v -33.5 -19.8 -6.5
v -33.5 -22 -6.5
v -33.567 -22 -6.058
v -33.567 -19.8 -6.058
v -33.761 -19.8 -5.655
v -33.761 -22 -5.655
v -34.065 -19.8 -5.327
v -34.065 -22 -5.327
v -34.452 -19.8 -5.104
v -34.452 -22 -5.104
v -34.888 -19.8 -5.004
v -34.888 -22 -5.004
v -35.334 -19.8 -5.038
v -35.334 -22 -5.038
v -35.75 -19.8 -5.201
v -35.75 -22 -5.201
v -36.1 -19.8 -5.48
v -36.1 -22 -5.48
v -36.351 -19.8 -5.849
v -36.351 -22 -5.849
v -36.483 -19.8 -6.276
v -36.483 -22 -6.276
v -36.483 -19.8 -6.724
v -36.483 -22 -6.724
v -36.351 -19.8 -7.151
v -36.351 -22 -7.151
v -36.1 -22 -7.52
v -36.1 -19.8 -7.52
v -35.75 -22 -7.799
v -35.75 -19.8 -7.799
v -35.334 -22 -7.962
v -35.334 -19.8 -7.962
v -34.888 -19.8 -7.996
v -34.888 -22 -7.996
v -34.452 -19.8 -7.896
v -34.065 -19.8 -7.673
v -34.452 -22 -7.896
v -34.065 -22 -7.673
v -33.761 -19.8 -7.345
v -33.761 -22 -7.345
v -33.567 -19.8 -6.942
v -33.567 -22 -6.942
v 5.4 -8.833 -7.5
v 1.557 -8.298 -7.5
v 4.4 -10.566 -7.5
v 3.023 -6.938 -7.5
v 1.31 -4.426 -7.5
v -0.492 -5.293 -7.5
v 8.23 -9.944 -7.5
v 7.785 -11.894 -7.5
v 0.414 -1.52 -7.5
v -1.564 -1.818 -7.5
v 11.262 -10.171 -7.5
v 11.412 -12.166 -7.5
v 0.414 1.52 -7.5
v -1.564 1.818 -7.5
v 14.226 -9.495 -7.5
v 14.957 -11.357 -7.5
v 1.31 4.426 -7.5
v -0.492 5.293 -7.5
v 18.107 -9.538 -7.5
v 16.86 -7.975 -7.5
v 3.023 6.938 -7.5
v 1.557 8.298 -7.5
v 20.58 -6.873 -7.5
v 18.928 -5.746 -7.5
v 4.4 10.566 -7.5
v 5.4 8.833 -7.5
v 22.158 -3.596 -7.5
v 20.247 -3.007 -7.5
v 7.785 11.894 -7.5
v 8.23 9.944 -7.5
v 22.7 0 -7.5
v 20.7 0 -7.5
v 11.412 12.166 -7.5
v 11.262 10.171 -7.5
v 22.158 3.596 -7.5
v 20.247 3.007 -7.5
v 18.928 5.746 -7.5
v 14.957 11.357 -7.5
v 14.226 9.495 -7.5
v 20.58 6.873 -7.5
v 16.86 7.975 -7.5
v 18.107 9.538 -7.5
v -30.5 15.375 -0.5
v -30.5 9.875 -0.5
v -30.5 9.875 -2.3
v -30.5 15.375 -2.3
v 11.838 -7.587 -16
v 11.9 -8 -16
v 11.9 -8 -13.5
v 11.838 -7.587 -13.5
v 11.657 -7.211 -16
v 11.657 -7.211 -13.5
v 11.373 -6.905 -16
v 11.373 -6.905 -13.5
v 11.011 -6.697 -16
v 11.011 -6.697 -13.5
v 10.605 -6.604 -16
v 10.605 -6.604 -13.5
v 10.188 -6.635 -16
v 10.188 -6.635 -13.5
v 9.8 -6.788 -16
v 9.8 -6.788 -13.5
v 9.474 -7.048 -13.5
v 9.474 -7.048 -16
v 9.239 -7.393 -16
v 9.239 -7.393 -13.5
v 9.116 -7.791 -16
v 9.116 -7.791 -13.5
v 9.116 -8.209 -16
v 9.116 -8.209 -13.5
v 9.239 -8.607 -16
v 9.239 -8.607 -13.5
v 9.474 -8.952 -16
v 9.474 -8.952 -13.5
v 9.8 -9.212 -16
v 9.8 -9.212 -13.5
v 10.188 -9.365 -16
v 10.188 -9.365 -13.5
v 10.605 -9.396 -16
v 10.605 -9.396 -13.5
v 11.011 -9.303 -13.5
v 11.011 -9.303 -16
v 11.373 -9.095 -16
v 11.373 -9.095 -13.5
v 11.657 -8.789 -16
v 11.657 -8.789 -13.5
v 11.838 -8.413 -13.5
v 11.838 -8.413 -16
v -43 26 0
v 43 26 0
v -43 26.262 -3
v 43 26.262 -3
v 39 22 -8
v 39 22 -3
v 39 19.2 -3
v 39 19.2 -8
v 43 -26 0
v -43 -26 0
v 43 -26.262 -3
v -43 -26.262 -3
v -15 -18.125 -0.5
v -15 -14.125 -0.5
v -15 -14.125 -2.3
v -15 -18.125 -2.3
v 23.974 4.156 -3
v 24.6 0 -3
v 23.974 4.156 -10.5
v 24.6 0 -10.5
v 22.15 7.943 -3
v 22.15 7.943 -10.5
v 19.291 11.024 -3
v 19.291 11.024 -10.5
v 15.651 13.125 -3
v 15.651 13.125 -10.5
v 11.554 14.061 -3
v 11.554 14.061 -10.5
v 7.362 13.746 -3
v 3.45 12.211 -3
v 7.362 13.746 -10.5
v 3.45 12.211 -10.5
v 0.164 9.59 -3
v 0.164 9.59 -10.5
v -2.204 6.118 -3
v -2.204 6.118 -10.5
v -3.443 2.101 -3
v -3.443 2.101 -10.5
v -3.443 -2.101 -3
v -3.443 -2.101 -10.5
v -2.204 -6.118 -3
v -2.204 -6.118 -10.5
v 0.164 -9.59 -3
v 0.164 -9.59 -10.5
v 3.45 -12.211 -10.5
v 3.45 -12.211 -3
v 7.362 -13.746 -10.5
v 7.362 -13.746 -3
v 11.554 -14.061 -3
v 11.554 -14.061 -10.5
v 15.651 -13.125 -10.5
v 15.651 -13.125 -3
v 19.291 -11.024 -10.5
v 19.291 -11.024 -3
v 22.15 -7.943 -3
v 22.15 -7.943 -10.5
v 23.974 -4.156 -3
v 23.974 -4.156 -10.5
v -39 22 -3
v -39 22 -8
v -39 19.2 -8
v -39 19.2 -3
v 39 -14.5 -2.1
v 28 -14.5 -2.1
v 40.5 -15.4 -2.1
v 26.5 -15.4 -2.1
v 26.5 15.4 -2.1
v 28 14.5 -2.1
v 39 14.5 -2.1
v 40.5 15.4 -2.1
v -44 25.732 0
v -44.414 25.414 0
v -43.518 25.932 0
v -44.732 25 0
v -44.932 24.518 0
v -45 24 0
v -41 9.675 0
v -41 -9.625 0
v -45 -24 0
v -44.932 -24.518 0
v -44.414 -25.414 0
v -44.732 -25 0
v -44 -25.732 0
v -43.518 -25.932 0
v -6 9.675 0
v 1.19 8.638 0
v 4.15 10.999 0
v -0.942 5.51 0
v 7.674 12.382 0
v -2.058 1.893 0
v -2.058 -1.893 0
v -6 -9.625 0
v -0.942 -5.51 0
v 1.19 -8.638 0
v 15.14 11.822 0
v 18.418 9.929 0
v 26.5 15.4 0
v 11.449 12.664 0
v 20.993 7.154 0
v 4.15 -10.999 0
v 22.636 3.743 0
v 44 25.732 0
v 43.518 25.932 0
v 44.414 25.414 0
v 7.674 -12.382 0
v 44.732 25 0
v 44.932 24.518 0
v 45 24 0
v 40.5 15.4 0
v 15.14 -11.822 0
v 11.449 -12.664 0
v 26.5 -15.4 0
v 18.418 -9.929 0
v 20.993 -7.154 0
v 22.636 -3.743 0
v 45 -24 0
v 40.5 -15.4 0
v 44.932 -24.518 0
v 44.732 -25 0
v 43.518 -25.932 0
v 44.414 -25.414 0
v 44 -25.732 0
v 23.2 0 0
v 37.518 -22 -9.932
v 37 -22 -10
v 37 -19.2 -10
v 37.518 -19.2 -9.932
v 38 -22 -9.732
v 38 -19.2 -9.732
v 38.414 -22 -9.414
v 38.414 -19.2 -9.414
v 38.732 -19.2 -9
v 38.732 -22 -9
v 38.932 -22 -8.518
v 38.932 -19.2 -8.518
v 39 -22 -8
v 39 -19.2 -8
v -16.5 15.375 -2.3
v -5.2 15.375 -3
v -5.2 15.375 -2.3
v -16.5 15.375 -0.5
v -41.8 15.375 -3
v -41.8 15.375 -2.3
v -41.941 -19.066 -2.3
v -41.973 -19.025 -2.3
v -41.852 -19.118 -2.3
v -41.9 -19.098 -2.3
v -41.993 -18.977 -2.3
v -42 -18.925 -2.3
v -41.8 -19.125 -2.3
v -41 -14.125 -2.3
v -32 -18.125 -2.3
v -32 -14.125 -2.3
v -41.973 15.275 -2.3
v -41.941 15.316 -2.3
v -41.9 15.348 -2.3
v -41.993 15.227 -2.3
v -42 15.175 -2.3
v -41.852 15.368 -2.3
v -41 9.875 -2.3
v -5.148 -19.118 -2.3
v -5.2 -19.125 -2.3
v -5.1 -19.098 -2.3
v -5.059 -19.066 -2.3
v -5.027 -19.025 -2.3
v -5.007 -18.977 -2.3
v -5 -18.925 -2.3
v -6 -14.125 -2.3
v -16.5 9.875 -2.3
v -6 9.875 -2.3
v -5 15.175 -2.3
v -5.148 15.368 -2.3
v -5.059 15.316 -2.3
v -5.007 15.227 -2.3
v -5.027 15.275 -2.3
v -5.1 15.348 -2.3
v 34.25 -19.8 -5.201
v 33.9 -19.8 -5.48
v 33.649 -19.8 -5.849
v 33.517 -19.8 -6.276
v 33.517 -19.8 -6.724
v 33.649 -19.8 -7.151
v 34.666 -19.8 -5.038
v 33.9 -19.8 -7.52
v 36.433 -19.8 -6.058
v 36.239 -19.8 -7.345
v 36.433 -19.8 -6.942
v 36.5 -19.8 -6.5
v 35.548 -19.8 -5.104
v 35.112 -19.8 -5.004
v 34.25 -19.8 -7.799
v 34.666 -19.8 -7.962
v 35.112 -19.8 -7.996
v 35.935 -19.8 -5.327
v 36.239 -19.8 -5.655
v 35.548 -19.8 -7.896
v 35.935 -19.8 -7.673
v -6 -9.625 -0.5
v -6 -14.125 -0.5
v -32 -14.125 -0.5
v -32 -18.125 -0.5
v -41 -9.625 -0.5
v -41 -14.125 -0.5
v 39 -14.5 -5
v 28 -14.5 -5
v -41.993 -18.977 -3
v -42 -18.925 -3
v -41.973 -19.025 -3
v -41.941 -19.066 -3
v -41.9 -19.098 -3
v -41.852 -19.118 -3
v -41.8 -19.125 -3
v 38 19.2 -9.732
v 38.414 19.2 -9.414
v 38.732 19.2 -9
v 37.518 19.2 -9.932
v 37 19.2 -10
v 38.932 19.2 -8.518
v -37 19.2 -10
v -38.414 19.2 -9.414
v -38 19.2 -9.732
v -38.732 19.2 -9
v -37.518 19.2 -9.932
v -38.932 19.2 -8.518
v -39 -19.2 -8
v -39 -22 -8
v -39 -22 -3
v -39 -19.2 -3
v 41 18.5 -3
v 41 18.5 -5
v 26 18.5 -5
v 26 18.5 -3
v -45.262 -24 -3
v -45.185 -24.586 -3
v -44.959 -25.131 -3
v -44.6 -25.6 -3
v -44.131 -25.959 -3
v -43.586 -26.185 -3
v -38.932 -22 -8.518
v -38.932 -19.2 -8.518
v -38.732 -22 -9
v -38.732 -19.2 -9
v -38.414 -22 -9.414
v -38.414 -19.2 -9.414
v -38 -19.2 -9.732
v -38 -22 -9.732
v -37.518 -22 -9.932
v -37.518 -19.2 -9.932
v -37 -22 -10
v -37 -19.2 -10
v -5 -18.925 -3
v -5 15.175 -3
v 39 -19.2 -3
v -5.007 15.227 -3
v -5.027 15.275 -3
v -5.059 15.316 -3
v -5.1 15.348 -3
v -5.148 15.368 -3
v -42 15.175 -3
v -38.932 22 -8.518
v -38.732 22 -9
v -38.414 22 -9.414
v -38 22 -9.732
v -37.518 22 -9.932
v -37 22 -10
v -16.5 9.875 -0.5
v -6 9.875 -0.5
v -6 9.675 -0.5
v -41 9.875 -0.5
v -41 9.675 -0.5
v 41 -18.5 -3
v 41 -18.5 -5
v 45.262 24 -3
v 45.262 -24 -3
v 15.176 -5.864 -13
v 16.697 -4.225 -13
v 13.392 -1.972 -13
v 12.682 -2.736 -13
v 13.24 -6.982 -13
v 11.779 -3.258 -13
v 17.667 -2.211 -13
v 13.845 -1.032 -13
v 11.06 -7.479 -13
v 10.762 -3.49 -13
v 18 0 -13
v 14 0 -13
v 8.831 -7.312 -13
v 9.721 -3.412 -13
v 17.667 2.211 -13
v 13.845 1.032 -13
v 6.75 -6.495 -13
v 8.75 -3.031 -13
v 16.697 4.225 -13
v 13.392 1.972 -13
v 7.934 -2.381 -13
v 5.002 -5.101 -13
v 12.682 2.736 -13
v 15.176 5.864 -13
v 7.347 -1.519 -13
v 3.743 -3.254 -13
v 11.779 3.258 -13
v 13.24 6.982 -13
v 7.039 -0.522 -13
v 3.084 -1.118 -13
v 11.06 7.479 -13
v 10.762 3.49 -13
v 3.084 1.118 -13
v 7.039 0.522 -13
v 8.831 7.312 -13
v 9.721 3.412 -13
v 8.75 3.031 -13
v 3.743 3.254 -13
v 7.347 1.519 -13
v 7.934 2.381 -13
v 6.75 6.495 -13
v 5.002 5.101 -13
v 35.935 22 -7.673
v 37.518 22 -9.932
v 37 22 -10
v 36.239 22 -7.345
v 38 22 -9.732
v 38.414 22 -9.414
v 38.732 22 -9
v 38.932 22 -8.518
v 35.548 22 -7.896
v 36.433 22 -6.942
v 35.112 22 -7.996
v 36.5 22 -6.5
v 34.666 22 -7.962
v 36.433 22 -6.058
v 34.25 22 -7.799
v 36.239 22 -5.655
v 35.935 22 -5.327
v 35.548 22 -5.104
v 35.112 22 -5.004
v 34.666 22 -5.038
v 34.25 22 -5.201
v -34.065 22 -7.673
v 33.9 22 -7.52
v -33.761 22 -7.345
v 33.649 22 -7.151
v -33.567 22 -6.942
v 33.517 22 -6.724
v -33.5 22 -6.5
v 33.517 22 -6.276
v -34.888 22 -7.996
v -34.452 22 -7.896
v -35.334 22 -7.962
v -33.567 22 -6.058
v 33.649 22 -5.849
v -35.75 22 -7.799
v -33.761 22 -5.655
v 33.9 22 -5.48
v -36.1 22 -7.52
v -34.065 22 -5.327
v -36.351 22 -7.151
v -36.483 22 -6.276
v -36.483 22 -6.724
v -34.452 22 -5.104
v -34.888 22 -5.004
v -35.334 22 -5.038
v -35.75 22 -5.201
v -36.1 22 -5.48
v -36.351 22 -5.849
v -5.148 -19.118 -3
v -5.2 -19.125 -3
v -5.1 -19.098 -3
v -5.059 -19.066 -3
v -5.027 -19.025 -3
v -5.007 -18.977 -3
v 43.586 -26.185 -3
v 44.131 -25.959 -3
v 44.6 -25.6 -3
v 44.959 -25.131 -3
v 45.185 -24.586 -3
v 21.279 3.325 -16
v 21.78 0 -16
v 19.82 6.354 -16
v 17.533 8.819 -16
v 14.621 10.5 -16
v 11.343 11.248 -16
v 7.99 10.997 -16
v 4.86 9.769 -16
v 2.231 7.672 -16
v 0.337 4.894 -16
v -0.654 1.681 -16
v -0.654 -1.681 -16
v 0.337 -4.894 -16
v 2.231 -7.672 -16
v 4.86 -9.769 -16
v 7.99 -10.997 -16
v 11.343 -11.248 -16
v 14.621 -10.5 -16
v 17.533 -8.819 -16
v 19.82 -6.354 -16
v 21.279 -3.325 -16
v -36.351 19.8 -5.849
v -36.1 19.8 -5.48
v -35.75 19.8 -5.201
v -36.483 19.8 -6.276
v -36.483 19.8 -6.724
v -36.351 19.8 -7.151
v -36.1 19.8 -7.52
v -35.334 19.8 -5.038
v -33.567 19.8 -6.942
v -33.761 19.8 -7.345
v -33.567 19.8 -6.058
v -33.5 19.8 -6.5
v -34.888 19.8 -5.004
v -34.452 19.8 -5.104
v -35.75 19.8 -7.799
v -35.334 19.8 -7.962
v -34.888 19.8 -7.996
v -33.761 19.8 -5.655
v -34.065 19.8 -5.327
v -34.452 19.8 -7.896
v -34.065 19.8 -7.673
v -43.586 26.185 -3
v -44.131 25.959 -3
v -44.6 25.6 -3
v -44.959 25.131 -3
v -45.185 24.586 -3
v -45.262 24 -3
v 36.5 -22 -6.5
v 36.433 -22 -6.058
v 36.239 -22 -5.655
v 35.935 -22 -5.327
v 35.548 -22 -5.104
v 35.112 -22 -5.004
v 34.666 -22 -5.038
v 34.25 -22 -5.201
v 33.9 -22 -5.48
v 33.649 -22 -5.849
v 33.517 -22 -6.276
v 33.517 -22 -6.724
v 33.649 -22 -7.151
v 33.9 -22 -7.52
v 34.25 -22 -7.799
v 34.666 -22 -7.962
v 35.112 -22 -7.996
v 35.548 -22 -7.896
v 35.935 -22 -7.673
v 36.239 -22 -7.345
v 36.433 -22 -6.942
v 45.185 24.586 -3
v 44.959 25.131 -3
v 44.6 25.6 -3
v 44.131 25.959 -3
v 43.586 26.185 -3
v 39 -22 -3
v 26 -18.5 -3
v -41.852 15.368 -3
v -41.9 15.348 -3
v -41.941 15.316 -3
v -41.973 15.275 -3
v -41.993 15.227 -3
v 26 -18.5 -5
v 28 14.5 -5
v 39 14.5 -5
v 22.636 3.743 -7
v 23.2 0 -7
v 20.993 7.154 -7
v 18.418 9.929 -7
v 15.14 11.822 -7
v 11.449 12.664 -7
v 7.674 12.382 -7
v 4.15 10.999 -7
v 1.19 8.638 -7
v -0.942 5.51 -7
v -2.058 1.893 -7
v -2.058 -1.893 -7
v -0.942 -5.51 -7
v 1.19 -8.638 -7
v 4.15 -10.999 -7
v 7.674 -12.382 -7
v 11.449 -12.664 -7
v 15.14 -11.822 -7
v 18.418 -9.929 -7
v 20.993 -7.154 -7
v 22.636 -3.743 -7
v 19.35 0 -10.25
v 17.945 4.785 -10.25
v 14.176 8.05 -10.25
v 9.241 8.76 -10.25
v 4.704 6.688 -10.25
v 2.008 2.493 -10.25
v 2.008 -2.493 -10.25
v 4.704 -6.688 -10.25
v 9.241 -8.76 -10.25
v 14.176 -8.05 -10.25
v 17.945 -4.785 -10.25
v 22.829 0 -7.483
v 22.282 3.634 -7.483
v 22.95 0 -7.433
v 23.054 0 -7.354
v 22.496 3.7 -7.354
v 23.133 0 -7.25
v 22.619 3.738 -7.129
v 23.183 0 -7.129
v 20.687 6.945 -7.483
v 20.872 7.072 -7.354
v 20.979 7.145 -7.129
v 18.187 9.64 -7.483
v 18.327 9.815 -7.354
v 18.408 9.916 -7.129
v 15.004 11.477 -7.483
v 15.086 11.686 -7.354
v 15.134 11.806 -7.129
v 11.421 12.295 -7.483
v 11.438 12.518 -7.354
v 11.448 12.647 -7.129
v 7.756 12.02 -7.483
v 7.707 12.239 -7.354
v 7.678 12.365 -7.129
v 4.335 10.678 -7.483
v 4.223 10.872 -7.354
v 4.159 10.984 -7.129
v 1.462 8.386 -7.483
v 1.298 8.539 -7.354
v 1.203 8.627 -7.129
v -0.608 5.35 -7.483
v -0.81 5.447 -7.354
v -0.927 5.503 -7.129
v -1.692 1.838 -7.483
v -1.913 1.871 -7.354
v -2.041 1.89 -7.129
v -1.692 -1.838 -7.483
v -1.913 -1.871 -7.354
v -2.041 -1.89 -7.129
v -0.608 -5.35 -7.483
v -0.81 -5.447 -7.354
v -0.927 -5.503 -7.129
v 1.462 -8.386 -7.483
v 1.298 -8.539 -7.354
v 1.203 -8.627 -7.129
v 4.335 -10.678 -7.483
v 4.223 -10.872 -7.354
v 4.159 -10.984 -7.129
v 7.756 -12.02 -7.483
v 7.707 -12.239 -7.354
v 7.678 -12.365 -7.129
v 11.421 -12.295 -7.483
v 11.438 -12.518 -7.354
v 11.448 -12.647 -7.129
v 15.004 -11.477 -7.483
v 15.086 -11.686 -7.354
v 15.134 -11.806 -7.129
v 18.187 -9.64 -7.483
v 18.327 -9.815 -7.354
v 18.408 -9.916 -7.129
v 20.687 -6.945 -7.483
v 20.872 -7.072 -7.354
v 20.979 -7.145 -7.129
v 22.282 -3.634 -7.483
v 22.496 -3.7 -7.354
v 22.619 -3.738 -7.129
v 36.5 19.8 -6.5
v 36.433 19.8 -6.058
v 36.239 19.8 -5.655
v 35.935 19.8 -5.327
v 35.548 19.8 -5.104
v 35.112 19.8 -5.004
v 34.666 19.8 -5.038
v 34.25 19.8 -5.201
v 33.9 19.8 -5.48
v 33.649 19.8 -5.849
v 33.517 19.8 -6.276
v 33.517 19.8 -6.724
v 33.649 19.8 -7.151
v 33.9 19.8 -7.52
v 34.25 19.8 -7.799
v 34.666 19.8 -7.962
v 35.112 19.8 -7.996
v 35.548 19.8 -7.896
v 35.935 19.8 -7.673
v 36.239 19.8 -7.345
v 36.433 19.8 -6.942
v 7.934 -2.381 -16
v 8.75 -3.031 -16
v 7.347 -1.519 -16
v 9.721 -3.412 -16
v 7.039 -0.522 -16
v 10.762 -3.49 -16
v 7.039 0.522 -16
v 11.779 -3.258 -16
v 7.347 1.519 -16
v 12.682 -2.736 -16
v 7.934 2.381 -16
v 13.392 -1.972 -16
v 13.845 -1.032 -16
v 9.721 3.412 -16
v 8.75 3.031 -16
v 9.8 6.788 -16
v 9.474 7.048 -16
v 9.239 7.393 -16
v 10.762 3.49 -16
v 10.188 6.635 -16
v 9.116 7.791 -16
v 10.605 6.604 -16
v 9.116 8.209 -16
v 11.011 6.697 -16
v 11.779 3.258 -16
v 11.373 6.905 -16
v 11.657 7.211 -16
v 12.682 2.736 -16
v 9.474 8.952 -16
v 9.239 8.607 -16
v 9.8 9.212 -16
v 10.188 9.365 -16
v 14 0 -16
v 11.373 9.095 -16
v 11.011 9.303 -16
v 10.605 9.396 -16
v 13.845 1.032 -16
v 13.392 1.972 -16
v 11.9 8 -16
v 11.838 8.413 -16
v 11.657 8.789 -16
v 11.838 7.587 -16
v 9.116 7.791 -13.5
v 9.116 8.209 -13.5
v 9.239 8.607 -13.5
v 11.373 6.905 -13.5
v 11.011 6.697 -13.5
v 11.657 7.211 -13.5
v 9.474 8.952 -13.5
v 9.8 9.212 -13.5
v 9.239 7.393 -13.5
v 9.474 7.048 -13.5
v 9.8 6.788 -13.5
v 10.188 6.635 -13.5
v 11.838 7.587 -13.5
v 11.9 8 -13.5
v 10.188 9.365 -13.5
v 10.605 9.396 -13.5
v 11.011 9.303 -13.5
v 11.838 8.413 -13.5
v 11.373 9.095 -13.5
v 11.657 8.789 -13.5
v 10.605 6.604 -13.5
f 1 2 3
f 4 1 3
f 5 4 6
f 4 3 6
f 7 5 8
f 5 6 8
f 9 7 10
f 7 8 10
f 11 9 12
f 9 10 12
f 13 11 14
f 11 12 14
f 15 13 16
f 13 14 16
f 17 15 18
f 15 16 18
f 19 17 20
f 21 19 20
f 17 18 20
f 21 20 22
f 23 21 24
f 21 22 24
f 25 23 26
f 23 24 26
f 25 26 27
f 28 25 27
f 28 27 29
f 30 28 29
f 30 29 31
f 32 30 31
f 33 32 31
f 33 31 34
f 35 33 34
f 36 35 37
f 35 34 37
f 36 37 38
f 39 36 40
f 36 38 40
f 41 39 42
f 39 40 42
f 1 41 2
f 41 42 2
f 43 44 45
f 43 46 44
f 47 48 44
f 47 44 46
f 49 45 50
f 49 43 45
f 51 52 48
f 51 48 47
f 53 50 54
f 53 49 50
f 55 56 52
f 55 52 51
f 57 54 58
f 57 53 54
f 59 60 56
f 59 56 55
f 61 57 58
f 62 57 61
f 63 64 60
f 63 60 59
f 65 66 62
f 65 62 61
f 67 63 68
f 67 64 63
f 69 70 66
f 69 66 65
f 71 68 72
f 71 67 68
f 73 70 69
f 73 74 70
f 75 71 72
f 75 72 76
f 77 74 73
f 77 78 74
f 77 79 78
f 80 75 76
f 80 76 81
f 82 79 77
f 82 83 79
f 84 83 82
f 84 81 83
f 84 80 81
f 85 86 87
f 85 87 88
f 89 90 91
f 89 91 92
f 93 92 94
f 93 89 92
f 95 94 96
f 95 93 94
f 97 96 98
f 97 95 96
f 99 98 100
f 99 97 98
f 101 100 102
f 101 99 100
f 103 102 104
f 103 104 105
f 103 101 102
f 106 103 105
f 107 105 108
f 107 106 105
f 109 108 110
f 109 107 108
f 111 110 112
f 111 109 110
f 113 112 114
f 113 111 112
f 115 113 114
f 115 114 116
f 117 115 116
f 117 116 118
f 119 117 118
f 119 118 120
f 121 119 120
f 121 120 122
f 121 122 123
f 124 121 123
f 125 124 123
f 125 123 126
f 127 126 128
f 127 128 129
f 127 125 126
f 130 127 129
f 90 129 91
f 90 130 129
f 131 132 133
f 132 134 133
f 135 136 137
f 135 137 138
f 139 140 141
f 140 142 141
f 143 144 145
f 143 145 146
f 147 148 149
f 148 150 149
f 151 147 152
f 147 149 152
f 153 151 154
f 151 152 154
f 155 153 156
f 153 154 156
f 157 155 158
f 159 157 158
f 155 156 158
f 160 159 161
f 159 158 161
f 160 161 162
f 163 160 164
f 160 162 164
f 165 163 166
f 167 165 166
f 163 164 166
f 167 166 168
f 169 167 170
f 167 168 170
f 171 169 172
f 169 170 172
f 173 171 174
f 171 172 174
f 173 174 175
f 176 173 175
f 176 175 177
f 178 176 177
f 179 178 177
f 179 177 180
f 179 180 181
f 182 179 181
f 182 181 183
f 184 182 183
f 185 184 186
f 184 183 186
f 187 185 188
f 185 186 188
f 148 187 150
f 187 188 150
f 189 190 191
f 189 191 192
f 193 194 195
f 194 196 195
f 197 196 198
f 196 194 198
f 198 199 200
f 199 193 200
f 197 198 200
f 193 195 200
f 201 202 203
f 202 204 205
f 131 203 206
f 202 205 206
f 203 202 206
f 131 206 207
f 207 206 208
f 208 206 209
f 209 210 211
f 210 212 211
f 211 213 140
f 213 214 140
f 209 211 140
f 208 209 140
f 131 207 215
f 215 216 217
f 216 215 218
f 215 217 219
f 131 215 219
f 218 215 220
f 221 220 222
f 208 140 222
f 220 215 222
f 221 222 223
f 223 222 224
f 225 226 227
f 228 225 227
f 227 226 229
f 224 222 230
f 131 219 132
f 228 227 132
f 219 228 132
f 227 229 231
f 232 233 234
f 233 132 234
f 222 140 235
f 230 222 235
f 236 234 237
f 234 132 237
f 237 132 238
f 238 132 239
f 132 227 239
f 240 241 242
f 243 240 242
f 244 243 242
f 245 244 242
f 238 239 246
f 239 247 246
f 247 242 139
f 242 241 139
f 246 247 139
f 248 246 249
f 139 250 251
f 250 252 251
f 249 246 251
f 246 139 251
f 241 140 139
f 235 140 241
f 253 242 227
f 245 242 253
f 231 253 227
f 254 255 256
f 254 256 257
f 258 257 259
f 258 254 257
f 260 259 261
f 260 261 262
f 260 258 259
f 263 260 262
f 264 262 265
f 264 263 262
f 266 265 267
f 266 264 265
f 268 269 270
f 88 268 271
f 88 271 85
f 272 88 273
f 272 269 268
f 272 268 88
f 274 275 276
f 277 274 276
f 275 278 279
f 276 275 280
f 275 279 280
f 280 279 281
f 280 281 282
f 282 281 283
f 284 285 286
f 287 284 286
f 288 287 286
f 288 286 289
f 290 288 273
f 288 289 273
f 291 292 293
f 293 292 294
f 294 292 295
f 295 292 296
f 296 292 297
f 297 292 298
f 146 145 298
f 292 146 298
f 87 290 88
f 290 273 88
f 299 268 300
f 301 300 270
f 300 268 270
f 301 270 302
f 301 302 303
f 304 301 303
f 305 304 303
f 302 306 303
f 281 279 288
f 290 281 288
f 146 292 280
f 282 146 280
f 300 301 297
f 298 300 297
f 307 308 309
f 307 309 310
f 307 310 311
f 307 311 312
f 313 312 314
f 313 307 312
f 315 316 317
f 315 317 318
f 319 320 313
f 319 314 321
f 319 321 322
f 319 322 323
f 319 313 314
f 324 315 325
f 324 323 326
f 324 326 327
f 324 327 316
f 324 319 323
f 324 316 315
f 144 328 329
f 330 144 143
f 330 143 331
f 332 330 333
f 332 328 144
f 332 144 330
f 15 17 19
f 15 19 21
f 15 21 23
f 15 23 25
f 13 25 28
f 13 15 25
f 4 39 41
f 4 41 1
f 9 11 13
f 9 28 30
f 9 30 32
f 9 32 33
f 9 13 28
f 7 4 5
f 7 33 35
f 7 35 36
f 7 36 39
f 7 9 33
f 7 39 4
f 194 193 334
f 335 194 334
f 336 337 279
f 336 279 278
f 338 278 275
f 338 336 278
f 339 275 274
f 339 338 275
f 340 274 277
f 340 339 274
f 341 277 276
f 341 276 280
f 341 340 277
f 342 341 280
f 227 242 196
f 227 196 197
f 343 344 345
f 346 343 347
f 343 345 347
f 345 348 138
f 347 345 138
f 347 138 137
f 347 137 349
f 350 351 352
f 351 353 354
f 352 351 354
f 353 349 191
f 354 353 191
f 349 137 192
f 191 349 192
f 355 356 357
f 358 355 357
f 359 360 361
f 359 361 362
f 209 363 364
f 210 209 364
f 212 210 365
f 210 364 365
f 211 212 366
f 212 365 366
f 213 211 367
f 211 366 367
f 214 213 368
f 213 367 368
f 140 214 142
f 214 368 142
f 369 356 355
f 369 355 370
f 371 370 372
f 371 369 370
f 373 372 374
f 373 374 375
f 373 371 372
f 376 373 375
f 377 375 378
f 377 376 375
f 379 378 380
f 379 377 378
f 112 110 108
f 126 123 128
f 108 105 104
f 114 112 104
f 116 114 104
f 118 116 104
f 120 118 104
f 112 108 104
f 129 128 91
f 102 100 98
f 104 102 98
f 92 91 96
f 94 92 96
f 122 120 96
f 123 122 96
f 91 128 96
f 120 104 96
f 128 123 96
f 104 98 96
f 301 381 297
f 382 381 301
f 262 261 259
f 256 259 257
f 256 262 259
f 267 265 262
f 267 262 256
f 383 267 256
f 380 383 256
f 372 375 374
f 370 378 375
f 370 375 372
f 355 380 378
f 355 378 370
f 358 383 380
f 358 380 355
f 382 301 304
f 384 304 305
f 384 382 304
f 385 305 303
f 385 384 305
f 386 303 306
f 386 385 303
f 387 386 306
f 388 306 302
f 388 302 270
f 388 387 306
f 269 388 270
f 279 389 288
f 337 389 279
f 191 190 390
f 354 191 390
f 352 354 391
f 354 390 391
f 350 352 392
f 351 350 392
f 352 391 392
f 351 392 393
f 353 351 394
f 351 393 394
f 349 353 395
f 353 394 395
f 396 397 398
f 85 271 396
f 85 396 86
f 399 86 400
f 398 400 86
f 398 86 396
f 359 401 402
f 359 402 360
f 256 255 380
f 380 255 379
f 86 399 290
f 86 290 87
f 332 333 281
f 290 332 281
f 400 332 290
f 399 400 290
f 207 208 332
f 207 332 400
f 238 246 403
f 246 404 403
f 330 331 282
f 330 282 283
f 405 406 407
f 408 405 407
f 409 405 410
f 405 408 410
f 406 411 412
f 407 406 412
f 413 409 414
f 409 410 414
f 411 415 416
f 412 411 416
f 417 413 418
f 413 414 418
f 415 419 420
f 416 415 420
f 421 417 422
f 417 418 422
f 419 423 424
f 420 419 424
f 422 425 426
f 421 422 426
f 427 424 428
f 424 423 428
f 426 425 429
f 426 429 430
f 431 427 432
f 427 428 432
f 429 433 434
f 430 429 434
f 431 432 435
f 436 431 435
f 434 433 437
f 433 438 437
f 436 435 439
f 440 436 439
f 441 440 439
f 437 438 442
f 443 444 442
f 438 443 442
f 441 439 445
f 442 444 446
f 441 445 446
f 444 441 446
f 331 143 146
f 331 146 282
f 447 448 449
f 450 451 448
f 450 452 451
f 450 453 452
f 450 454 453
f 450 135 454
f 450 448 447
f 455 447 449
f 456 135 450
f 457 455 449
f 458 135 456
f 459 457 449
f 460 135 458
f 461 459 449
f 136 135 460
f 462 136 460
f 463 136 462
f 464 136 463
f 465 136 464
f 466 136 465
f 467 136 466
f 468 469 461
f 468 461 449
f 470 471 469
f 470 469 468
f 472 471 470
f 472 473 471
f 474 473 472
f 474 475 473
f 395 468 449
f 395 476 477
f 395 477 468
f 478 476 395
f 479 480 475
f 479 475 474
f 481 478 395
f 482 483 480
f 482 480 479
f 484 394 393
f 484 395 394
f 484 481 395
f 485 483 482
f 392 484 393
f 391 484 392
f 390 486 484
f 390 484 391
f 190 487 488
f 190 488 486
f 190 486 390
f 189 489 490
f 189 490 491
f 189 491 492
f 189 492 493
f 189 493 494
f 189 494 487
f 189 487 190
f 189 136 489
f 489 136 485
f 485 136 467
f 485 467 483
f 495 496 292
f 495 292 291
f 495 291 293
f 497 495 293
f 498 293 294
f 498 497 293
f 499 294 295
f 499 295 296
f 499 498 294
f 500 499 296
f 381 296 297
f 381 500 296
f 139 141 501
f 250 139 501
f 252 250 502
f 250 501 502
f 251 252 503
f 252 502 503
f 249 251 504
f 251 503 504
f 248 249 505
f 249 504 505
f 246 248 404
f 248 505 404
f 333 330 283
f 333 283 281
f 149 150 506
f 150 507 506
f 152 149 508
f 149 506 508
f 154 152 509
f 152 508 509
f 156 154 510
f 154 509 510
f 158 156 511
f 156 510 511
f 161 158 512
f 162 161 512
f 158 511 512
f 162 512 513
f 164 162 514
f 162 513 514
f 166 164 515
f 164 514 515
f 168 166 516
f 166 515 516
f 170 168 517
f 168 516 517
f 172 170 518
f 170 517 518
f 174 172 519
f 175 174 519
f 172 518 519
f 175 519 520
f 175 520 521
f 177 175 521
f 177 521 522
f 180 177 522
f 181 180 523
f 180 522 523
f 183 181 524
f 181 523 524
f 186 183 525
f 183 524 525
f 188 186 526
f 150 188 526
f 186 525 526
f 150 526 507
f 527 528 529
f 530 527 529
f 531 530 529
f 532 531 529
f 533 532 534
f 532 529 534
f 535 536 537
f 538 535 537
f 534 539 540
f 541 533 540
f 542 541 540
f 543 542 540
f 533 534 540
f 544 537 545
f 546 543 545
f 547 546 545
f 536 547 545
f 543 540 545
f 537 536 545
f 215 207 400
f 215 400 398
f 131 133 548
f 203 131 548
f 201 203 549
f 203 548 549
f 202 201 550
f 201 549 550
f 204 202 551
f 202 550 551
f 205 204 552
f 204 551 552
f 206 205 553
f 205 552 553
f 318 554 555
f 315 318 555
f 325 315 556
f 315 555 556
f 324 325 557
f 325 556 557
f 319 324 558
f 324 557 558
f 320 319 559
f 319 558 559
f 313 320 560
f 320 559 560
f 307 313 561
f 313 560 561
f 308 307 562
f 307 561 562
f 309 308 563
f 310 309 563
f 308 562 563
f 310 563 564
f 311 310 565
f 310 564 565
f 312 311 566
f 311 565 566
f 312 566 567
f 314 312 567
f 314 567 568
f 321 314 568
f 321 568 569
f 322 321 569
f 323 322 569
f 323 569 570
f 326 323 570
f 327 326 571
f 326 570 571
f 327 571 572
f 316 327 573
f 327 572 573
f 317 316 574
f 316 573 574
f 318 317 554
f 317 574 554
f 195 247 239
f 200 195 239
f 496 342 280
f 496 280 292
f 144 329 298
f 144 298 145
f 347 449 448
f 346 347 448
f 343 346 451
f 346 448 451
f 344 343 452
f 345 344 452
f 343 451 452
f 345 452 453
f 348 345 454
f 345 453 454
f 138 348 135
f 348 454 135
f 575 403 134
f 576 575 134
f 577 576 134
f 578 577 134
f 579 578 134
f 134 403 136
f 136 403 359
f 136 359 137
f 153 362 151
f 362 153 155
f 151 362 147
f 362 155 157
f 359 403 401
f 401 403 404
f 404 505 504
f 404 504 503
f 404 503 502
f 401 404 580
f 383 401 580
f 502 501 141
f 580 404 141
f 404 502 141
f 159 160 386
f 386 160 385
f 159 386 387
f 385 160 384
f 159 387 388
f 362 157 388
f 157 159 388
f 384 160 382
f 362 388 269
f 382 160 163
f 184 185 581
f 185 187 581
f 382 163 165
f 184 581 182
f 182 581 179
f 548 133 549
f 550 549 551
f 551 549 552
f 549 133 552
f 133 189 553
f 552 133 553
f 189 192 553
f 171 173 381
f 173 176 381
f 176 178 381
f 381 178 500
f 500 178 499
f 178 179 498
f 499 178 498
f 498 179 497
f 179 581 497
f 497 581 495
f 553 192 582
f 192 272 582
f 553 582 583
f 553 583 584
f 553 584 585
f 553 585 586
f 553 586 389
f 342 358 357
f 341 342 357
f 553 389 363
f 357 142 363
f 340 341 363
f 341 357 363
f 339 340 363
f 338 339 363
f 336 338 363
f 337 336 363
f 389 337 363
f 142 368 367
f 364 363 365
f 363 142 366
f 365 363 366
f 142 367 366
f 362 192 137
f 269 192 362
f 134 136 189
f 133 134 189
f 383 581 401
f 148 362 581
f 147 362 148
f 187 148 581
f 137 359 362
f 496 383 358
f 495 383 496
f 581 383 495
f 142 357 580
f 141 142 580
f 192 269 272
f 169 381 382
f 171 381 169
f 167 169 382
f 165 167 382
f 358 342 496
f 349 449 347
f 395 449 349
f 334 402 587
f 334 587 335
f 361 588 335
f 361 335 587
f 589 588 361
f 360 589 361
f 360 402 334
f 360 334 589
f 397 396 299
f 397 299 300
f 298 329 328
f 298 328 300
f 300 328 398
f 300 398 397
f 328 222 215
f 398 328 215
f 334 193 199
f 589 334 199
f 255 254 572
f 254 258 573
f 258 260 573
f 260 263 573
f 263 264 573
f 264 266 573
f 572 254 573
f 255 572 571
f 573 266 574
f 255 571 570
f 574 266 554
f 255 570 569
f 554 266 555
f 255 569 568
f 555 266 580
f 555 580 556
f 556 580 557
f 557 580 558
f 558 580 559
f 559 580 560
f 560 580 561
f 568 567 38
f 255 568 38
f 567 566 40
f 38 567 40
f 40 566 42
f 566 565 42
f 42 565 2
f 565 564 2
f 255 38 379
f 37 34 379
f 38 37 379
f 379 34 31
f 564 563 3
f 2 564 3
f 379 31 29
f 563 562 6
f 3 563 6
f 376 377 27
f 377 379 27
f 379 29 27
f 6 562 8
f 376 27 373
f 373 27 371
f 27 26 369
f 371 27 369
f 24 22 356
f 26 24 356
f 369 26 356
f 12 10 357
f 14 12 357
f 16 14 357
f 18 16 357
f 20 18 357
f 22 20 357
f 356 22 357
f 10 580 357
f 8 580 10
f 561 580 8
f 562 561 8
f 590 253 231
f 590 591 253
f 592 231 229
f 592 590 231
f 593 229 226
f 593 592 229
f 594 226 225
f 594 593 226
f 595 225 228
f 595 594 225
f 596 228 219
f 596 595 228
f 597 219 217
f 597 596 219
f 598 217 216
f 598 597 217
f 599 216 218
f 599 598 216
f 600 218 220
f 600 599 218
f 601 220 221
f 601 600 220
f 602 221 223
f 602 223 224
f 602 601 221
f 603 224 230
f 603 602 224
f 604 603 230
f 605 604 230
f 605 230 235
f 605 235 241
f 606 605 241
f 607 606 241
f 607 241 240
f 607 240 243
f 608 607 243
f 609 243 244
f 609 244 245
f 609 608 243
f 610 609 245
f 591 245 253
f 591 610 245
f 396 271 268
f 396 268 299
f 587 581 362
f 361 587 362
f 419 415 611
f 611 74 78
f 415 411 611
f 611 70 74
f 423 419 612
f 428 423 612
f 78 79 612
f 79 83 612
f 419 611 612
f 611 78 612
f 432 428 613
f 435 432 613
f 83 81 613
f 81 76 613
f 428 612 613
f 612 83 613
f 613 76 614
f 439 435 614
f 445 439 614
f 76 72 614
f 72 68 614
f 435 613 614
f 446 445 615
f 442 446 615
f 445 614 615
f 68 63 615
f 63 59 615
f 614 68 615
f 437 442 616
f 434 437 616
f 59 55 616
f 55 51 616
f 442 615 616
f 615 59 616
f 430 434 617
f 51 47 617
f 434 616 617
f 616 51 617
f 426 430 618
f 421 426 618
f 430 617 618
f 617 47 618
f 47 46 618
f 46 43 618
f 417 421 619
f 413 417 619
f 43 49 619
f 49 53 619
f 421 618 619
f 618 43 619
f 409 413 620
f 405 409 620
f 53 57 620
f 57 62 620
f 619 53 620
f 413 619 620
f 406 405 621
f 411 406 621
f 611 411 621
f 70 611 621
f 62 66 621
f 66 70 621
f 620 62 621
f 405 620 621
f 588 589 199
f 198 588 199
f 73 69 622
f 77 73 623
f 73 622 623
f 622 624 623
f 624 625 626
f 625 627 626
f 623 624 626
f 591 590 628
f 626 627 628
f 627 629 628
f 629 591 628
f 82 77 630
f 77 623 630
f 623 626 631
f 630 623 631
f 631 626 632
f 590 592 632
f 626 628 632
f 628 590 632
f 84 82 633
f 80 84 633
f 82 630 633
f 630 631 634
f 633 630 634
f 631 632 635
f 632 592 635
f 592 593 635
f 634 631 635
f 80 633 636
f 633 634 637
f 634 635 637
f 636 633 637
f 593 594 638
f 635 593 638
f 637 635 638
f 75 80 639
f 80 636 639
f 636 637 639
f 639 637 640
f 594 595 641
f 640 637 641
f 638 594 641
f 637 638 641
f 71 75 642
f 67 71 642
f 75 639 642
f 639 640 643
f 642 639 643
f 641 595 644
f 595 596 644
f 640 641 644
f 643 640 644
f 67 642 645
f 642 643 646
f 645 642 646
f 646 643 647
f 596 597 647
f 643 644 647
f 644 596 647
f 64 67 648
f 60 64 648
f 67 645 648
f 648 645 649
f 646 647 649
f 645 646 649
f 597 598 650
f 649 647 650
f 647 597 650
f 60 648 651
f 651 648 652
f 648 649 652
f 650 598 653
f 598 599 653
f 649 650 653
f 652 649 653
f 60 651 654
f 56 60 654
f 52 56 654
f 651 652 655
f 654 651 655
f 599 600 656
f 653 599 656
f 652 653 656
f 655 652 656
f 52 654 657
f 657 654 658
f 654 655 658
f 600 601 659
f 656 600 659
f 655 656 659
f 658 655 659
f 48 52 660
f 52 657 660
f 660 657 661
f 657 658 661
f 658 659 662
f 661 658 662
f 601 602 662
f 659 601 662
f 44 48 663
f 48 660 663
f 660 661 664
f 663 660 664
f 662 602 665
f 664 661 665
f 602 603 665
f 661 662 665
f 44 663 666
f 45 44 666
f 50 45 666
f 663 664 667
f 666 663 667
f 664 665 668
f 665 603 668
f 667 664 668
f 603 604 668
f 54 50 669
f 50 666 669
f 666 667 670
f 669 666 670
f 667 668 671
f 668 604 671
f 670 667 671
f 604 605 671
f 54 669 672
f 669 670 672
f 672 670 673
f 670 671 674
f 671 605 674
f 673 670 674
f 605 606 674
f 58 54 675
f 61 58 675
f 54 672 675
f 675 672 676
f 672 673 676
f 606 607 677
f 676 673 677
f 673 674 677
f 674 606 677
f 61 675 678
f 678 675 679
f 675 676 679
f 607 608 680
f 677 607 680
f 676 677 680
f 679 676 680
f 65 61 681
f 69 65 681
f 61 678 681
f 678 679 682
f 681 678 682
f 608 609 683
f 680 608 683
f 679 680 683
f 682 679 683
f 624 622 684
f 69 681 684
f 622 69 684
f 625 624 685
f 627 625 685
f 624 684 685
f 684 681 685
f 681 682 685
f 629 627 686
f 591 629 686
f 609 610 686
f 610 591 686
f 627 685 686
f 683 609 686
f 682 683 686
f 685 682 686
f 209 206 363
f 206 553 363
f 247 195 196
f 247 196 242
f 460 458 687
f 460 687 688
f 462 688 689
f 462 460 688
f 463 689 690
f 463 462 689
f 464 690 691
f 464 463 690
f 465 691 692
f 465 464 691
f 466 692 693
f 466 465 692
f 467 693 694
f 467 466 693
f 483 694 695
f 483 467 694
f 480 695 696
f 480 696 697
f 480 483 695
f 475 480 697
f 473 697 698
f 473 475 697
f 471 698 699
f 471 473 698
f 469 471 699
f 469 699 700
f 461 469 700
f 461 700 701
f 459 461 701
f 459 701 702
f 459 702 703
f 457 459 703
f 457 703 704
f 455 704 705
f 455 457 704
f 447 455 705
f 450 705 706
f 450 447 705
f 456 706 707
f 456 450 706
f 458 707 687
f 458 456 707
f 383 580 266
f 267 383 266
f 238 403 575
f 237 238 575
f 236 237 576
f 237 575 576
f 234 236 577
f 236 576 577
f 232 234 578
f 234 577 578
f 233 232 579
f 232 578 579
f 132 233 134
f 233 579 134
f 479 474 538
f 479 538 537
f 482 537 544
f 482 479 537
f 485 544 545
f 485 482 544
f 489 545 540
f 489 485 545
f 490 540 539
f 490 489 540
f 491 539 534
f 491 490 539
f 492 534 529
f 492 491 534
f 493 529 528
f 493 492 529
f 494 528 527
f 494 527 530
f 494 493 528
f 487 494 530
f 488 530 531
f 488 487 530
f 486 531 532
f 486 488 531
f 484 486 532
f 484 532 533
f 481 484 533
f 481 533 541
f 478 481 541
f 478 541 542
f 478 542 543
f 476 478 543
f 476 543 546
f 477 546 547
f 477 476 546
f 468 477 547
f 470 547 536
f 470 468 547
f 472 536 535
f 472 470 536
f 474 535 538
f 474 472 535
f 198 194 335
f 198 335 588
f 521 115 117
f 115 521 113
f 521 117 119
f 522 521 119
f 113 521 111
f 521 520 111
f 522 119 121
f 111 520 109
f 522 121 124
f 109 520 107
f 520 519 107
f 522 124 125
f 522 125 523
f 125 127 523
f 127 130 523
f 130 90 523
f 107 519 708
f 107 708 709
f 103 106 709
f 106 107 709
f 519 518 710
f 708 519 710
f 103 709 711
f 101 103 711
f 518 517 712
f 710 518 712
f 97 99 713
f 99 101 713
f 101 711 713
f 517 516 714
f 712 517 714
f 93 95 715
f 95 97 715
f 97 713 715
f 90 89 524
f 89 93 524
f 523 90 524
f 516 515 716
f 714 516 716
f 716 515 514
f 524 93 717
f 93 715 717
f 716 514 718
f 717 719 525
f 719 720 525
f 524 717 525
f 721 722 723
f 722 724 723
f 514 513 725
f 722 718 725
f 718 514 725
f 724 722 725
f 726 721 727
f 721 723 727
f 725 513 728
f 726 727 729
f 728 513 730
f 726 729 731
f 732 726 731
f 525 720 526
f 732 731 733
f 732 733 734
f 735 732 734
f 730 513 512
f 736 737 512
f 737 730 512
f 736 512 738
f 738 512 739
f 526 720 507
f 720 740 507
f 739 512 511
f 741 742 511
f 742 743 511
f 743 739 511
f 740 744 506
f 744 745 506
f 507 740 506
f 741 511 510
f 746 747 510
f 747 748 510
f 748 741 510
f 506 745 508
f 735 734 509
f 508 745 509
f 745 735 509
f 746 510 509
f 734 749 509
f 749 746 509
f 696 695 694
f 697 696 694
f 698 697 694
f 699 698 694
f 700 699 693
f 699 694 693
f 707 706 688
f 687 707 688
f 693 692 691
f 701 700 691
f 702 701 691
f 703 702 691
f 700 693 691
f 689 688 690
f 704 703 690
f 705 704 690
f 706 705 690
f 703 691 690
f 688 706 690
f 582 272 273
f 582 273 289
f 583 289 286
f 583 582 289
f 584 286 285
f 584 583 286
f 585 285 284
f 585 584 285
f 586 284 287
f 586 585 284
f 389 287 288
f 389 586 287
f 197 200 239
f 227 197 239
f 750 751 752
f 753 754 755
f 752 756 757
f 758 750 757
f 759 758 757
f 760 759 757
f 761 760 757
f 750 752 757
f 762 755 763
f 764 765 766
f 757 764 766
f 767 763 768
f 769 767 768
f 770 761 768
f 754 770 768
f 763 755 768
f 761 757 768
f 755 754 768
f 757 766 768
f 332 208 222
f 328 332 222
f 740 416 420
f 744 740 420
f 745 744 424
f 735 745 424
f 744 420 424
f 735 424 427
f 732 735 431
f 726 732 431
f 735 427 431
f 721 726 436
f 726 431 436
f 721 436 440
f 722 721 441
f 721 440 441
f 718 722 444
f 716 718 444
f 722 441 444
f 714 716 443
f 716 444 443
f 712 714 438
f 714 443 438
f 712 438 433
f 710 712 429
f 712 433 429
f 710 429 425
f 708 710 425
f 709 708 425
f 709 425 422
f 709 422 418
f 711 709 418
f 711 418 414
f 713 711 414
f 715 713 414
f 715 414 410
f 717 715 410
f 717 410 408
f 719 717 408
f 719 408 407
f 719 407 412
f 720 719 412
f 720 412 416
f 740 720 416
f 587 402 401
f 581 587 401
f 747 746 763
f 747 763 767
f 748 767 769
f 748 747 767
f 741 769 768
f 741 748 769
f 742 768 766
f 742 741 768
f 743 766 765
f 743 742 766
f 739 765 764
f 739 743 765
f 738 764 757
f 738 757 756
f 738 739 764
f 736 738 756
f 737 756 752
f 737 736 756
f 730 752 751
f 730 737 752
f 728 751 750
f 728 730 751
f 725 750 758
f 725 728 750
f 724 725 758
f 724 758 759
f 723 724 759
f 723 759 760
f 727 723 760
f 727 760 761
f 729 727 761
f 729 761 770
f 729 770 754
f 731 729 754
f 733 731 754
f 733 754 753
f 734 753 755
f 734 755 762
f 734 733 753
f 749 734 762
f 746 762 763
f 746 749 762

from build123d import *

# Parameters (mm, degrees)
PAD011_DEPTH         = 3
PAD011_TAPER         = -5
PAD012_DEPTH         = 2.8
SKETCH036_R          = 1.5
HOLE001_DEPTH        = 2.2
SKETCH034_R          = 14.1
SKETCH047_R          = 14.1
SKETCH048_R          = 11.28
SKETCH028_R          = 3.5
POCKET010_DEPTH      = 16.001
SKETCH073_R          = 1.4
POCKET023_DEPTH      = 2.5
POCKET019_DEPTH      = 1.2
POCKET012_DEPTH      = 5
SKETCH072_W          = 35
SKETCH072_H          = 19.3
POCKET022_DEPTH      = 16.001
POCKET022_DEPTH_BACK = 0.001
SKETCH_W             = 37
SKETCH_H             = 5
PAD_DEPTH            = 7.5
SKETCH058_W          = 30.8
SKETCH058_H          = 2.1
POCKET_DEPTH         = 7
POCKET021_DEPTH      = 5.5


with BuildPart() as part:
    # Sketch024 → Pad011 (new body)
    with BuildSketch(Plane.XY):
        with BuildLine():
            Line((-45, 24), (-45, -24))
            ThreePointArc((-45, -24), (-44.414214, -25.414214), (-43, -26))
            Line((-43, -26), (43, -26))
            ThreePointArc((43, -26), (44.414214, -25.414214), (45, -24))
            Line((45, -24), (45, 24))
            ThreePointArc((45, 24), (44.414214, 25.414214), (43, 26))
            Line((43, 26), (-43, 26))
            ThreePointArc((-43, 26), (-44.414214, 25.414214), (-45, 24))
        make_face()
    extrude(amount=-PAD011_DEPTH, taper=PAD011_TAPER)

    # Sketch033 → Pad012 (join)
    with BuildSketch(Plane.XZ.offset(-22)):
        with BuildLine():
            Line((-39, 0), (39, 0))
            Line((39, 0), (39, -8))
            ThreePointArc((37, -10), (38.414214, -9.414214), (39, -8))
            Line((37, -10), (-37, -10))
            ThreePointArc((-39, -8), (-38.414214, -9.414214), (-37, -10))
            Line((-39, -8), (-39, 0))
        make_face()
    pad012 = extrude(amount=PAD012_DEPTH)

    # Sketch036 → Hole001 (cut)
    with BuildSketch(Plane.XZ.offset(-22)):
        with Locations((-35, -6.5)):
            Circle(SKETCH036_R)
        with Locations((35, -6.5)):
            Circle(SKETCH036_R)
    hole001 = extrude(amount=HOLE001_DEPTH, mode=Mode.SUBTRACT)

    # Mirrored: Pad012, Hole001 across XZ
    add(pad012.mirror(Plane.XZ))
    add(hole001.mirror(Plane.XZ), mode=Mode.SUBTRACT)

    # Sketch034 → AdditiveLoft section 0
    with BuildSketch(Plane.XY.offset(-3)):
        with Locations((10.5, 0)):
            Circle(SKETCH034_R)
    # Sketch047 → AdditiveLoft section 1
    with BuildSketch(Plane.XY.offset(-10.5)):
        with Locations((10.5, 0)):
            Circle(SKETCH047_R)
    # Sketch048 → AdditiveLoft section 2
    with BuildSketch(Plane.XY.offset(-16)):
        with Locations((10.5, 0)):
            Circle(SKETCH048_R)
    loft(ruled=True)

    # Sketch026 → Groove (revolve, cut)
    with BuildSketch(Plane(origin=(10.5, 0, 0), x_dir=(1, 0, 0), z_dir=(0, -1, 0))):
        with BuildLine():
            Line((0, 0), (12.7, 0))
            Line((12.7, 0), (12.7, -7))
            ThreePointArc((12.2, -7.5), (12.553553, -7.353553), (12.7, -7))
            Line((12.2, -7.5), (10.2, -7.5))
            Line((7.5, -13), (10.2, -7.5))
            Line((0, -13), (7.5, -13))
            Line((0, -13), (0, 0))
        make_face()
    revolve(axis=Axis((10.5, 0, 0), (0, 0, 1)), mode=Mode.SUBTRACT)

    # Sketch028 → Pocket010 (cut, through all)
    with BuildSketch(Plane.XY):
        with Locations((10.5, 0)):
            Circle(SKETCH028_R)
    extrude(amount=-POCKET010_DEPTH, mode=Mode.SUBTRACT)

    # Sketch073 → Pocket023 (cut)
    with BuildSketch(Plane.XY.offset(-16)):
        with Locations((10.5, -8)):
            Circle(SKETCH073_R)
        with Locations((10.5, 8)):
            Circle(SKETCH073_R)
    extrude(amount=POCKET023_DEPTH, mode=Mode.SUBTRACT)

    # Sketch053 → Pocket019 (cut)
    with BuildSketch(Plane.XY.offset(-3.5)):
        with BuildLine():
            Line((-42, 15.175), (-42, -18.925))
            ThreePointArc((-42, -18.925), (-41.941421, -19.066421), (-41.8, -19.125))
            Line((-41.8, -19.125), (-5.2, -19.125))
            ThreePointArc((-5.2, -19.125), (-5.058579, -19.066421), (-5, -18.925))
            Line((-5, -18.925), (-5, 15.175))
            ThreePointArc((-5, 15.175), (-5.058579, 15.316421), (-5.2, 15.375))
            Line((-5.2, 15.375), (-41.8, 15.375))
            ThreePointArc((-41.8, 15.375), (-41.941421, 15.316421), (-42, 15.175))
        make_face()
    extrude(amount=POCKET019_DEPTH, mode=Mode.SUBTRACT)

    # Sketch030 → Pocket012 (cut)
    with BuildSketch(Plane.XY.offset(-0.5)):
        Polygon((-30.5, 15.375), (-16.5, 15.375), (-16.5, 9.875), (-6, 9.875), (-6, -14.125), (-15, -14.125), (-15, -18.125), (-32, -18.125), (-32, -14.125), (-41, -14.125), (-41, 9.875), (-30.5, 9.875), align=None)
    extrude(amount=-POCKET012_DEPTH, mode=Mode.SUBTRACT)

    # Sketch072 → Pocket022 (cut, two sides)
    with BuildSketch(Plane.XY) as pocket022_sk:
        with Locations((-23.5, 0.025)):
            Rectangle(SKETCH072_W, SKETCH072_H)
    extrude(amount=-POCKET022_DEPTH, mode=Mode.SUBTRACT)
    extrude(pocket022_sk.sketch, amount=POCKET022_DEPTH_BACK, mode=Mode.SUBTRACT)

    # Sketch → Pad (join, symmetric)
    with BuildSketch(Plane.YZ.offset(33.5)):
        with Locations((0, -2.5)):
            Rectangle(SKETCH_W, SKETCH_H)
    extrude(amount=PAD_DEPTH, both=True)

    # Sketch058 → Pocket (cut, symmetric)
    with BuildSketch(Plane.YZ.offset(33.5)):
        with Locations((0, -1.05)):
            Rectangle(SKETCH058_W, SKETCH058_H)
    extrude(amount=POCKET_DEPTH, both=True, mode=Mode.SUBTRACT)

    # Sketch059 → Pocket021 (cut, symmetric)
    with BuildSketch(Plane.YZ.offset(33.5)):
        Polygon((-15.4, 0), (-15.4, -2.1), (-14.5, -2.1), (-14.5, -22.1), (14.5, -22.1), (14.5, -2.1), (15.4, -2.1), (15.4, 0), align=None)
    extrude(amount=POCKET021_DEPTH, both=True, mode=Mode.SUBTRACT)


solid = part.part
